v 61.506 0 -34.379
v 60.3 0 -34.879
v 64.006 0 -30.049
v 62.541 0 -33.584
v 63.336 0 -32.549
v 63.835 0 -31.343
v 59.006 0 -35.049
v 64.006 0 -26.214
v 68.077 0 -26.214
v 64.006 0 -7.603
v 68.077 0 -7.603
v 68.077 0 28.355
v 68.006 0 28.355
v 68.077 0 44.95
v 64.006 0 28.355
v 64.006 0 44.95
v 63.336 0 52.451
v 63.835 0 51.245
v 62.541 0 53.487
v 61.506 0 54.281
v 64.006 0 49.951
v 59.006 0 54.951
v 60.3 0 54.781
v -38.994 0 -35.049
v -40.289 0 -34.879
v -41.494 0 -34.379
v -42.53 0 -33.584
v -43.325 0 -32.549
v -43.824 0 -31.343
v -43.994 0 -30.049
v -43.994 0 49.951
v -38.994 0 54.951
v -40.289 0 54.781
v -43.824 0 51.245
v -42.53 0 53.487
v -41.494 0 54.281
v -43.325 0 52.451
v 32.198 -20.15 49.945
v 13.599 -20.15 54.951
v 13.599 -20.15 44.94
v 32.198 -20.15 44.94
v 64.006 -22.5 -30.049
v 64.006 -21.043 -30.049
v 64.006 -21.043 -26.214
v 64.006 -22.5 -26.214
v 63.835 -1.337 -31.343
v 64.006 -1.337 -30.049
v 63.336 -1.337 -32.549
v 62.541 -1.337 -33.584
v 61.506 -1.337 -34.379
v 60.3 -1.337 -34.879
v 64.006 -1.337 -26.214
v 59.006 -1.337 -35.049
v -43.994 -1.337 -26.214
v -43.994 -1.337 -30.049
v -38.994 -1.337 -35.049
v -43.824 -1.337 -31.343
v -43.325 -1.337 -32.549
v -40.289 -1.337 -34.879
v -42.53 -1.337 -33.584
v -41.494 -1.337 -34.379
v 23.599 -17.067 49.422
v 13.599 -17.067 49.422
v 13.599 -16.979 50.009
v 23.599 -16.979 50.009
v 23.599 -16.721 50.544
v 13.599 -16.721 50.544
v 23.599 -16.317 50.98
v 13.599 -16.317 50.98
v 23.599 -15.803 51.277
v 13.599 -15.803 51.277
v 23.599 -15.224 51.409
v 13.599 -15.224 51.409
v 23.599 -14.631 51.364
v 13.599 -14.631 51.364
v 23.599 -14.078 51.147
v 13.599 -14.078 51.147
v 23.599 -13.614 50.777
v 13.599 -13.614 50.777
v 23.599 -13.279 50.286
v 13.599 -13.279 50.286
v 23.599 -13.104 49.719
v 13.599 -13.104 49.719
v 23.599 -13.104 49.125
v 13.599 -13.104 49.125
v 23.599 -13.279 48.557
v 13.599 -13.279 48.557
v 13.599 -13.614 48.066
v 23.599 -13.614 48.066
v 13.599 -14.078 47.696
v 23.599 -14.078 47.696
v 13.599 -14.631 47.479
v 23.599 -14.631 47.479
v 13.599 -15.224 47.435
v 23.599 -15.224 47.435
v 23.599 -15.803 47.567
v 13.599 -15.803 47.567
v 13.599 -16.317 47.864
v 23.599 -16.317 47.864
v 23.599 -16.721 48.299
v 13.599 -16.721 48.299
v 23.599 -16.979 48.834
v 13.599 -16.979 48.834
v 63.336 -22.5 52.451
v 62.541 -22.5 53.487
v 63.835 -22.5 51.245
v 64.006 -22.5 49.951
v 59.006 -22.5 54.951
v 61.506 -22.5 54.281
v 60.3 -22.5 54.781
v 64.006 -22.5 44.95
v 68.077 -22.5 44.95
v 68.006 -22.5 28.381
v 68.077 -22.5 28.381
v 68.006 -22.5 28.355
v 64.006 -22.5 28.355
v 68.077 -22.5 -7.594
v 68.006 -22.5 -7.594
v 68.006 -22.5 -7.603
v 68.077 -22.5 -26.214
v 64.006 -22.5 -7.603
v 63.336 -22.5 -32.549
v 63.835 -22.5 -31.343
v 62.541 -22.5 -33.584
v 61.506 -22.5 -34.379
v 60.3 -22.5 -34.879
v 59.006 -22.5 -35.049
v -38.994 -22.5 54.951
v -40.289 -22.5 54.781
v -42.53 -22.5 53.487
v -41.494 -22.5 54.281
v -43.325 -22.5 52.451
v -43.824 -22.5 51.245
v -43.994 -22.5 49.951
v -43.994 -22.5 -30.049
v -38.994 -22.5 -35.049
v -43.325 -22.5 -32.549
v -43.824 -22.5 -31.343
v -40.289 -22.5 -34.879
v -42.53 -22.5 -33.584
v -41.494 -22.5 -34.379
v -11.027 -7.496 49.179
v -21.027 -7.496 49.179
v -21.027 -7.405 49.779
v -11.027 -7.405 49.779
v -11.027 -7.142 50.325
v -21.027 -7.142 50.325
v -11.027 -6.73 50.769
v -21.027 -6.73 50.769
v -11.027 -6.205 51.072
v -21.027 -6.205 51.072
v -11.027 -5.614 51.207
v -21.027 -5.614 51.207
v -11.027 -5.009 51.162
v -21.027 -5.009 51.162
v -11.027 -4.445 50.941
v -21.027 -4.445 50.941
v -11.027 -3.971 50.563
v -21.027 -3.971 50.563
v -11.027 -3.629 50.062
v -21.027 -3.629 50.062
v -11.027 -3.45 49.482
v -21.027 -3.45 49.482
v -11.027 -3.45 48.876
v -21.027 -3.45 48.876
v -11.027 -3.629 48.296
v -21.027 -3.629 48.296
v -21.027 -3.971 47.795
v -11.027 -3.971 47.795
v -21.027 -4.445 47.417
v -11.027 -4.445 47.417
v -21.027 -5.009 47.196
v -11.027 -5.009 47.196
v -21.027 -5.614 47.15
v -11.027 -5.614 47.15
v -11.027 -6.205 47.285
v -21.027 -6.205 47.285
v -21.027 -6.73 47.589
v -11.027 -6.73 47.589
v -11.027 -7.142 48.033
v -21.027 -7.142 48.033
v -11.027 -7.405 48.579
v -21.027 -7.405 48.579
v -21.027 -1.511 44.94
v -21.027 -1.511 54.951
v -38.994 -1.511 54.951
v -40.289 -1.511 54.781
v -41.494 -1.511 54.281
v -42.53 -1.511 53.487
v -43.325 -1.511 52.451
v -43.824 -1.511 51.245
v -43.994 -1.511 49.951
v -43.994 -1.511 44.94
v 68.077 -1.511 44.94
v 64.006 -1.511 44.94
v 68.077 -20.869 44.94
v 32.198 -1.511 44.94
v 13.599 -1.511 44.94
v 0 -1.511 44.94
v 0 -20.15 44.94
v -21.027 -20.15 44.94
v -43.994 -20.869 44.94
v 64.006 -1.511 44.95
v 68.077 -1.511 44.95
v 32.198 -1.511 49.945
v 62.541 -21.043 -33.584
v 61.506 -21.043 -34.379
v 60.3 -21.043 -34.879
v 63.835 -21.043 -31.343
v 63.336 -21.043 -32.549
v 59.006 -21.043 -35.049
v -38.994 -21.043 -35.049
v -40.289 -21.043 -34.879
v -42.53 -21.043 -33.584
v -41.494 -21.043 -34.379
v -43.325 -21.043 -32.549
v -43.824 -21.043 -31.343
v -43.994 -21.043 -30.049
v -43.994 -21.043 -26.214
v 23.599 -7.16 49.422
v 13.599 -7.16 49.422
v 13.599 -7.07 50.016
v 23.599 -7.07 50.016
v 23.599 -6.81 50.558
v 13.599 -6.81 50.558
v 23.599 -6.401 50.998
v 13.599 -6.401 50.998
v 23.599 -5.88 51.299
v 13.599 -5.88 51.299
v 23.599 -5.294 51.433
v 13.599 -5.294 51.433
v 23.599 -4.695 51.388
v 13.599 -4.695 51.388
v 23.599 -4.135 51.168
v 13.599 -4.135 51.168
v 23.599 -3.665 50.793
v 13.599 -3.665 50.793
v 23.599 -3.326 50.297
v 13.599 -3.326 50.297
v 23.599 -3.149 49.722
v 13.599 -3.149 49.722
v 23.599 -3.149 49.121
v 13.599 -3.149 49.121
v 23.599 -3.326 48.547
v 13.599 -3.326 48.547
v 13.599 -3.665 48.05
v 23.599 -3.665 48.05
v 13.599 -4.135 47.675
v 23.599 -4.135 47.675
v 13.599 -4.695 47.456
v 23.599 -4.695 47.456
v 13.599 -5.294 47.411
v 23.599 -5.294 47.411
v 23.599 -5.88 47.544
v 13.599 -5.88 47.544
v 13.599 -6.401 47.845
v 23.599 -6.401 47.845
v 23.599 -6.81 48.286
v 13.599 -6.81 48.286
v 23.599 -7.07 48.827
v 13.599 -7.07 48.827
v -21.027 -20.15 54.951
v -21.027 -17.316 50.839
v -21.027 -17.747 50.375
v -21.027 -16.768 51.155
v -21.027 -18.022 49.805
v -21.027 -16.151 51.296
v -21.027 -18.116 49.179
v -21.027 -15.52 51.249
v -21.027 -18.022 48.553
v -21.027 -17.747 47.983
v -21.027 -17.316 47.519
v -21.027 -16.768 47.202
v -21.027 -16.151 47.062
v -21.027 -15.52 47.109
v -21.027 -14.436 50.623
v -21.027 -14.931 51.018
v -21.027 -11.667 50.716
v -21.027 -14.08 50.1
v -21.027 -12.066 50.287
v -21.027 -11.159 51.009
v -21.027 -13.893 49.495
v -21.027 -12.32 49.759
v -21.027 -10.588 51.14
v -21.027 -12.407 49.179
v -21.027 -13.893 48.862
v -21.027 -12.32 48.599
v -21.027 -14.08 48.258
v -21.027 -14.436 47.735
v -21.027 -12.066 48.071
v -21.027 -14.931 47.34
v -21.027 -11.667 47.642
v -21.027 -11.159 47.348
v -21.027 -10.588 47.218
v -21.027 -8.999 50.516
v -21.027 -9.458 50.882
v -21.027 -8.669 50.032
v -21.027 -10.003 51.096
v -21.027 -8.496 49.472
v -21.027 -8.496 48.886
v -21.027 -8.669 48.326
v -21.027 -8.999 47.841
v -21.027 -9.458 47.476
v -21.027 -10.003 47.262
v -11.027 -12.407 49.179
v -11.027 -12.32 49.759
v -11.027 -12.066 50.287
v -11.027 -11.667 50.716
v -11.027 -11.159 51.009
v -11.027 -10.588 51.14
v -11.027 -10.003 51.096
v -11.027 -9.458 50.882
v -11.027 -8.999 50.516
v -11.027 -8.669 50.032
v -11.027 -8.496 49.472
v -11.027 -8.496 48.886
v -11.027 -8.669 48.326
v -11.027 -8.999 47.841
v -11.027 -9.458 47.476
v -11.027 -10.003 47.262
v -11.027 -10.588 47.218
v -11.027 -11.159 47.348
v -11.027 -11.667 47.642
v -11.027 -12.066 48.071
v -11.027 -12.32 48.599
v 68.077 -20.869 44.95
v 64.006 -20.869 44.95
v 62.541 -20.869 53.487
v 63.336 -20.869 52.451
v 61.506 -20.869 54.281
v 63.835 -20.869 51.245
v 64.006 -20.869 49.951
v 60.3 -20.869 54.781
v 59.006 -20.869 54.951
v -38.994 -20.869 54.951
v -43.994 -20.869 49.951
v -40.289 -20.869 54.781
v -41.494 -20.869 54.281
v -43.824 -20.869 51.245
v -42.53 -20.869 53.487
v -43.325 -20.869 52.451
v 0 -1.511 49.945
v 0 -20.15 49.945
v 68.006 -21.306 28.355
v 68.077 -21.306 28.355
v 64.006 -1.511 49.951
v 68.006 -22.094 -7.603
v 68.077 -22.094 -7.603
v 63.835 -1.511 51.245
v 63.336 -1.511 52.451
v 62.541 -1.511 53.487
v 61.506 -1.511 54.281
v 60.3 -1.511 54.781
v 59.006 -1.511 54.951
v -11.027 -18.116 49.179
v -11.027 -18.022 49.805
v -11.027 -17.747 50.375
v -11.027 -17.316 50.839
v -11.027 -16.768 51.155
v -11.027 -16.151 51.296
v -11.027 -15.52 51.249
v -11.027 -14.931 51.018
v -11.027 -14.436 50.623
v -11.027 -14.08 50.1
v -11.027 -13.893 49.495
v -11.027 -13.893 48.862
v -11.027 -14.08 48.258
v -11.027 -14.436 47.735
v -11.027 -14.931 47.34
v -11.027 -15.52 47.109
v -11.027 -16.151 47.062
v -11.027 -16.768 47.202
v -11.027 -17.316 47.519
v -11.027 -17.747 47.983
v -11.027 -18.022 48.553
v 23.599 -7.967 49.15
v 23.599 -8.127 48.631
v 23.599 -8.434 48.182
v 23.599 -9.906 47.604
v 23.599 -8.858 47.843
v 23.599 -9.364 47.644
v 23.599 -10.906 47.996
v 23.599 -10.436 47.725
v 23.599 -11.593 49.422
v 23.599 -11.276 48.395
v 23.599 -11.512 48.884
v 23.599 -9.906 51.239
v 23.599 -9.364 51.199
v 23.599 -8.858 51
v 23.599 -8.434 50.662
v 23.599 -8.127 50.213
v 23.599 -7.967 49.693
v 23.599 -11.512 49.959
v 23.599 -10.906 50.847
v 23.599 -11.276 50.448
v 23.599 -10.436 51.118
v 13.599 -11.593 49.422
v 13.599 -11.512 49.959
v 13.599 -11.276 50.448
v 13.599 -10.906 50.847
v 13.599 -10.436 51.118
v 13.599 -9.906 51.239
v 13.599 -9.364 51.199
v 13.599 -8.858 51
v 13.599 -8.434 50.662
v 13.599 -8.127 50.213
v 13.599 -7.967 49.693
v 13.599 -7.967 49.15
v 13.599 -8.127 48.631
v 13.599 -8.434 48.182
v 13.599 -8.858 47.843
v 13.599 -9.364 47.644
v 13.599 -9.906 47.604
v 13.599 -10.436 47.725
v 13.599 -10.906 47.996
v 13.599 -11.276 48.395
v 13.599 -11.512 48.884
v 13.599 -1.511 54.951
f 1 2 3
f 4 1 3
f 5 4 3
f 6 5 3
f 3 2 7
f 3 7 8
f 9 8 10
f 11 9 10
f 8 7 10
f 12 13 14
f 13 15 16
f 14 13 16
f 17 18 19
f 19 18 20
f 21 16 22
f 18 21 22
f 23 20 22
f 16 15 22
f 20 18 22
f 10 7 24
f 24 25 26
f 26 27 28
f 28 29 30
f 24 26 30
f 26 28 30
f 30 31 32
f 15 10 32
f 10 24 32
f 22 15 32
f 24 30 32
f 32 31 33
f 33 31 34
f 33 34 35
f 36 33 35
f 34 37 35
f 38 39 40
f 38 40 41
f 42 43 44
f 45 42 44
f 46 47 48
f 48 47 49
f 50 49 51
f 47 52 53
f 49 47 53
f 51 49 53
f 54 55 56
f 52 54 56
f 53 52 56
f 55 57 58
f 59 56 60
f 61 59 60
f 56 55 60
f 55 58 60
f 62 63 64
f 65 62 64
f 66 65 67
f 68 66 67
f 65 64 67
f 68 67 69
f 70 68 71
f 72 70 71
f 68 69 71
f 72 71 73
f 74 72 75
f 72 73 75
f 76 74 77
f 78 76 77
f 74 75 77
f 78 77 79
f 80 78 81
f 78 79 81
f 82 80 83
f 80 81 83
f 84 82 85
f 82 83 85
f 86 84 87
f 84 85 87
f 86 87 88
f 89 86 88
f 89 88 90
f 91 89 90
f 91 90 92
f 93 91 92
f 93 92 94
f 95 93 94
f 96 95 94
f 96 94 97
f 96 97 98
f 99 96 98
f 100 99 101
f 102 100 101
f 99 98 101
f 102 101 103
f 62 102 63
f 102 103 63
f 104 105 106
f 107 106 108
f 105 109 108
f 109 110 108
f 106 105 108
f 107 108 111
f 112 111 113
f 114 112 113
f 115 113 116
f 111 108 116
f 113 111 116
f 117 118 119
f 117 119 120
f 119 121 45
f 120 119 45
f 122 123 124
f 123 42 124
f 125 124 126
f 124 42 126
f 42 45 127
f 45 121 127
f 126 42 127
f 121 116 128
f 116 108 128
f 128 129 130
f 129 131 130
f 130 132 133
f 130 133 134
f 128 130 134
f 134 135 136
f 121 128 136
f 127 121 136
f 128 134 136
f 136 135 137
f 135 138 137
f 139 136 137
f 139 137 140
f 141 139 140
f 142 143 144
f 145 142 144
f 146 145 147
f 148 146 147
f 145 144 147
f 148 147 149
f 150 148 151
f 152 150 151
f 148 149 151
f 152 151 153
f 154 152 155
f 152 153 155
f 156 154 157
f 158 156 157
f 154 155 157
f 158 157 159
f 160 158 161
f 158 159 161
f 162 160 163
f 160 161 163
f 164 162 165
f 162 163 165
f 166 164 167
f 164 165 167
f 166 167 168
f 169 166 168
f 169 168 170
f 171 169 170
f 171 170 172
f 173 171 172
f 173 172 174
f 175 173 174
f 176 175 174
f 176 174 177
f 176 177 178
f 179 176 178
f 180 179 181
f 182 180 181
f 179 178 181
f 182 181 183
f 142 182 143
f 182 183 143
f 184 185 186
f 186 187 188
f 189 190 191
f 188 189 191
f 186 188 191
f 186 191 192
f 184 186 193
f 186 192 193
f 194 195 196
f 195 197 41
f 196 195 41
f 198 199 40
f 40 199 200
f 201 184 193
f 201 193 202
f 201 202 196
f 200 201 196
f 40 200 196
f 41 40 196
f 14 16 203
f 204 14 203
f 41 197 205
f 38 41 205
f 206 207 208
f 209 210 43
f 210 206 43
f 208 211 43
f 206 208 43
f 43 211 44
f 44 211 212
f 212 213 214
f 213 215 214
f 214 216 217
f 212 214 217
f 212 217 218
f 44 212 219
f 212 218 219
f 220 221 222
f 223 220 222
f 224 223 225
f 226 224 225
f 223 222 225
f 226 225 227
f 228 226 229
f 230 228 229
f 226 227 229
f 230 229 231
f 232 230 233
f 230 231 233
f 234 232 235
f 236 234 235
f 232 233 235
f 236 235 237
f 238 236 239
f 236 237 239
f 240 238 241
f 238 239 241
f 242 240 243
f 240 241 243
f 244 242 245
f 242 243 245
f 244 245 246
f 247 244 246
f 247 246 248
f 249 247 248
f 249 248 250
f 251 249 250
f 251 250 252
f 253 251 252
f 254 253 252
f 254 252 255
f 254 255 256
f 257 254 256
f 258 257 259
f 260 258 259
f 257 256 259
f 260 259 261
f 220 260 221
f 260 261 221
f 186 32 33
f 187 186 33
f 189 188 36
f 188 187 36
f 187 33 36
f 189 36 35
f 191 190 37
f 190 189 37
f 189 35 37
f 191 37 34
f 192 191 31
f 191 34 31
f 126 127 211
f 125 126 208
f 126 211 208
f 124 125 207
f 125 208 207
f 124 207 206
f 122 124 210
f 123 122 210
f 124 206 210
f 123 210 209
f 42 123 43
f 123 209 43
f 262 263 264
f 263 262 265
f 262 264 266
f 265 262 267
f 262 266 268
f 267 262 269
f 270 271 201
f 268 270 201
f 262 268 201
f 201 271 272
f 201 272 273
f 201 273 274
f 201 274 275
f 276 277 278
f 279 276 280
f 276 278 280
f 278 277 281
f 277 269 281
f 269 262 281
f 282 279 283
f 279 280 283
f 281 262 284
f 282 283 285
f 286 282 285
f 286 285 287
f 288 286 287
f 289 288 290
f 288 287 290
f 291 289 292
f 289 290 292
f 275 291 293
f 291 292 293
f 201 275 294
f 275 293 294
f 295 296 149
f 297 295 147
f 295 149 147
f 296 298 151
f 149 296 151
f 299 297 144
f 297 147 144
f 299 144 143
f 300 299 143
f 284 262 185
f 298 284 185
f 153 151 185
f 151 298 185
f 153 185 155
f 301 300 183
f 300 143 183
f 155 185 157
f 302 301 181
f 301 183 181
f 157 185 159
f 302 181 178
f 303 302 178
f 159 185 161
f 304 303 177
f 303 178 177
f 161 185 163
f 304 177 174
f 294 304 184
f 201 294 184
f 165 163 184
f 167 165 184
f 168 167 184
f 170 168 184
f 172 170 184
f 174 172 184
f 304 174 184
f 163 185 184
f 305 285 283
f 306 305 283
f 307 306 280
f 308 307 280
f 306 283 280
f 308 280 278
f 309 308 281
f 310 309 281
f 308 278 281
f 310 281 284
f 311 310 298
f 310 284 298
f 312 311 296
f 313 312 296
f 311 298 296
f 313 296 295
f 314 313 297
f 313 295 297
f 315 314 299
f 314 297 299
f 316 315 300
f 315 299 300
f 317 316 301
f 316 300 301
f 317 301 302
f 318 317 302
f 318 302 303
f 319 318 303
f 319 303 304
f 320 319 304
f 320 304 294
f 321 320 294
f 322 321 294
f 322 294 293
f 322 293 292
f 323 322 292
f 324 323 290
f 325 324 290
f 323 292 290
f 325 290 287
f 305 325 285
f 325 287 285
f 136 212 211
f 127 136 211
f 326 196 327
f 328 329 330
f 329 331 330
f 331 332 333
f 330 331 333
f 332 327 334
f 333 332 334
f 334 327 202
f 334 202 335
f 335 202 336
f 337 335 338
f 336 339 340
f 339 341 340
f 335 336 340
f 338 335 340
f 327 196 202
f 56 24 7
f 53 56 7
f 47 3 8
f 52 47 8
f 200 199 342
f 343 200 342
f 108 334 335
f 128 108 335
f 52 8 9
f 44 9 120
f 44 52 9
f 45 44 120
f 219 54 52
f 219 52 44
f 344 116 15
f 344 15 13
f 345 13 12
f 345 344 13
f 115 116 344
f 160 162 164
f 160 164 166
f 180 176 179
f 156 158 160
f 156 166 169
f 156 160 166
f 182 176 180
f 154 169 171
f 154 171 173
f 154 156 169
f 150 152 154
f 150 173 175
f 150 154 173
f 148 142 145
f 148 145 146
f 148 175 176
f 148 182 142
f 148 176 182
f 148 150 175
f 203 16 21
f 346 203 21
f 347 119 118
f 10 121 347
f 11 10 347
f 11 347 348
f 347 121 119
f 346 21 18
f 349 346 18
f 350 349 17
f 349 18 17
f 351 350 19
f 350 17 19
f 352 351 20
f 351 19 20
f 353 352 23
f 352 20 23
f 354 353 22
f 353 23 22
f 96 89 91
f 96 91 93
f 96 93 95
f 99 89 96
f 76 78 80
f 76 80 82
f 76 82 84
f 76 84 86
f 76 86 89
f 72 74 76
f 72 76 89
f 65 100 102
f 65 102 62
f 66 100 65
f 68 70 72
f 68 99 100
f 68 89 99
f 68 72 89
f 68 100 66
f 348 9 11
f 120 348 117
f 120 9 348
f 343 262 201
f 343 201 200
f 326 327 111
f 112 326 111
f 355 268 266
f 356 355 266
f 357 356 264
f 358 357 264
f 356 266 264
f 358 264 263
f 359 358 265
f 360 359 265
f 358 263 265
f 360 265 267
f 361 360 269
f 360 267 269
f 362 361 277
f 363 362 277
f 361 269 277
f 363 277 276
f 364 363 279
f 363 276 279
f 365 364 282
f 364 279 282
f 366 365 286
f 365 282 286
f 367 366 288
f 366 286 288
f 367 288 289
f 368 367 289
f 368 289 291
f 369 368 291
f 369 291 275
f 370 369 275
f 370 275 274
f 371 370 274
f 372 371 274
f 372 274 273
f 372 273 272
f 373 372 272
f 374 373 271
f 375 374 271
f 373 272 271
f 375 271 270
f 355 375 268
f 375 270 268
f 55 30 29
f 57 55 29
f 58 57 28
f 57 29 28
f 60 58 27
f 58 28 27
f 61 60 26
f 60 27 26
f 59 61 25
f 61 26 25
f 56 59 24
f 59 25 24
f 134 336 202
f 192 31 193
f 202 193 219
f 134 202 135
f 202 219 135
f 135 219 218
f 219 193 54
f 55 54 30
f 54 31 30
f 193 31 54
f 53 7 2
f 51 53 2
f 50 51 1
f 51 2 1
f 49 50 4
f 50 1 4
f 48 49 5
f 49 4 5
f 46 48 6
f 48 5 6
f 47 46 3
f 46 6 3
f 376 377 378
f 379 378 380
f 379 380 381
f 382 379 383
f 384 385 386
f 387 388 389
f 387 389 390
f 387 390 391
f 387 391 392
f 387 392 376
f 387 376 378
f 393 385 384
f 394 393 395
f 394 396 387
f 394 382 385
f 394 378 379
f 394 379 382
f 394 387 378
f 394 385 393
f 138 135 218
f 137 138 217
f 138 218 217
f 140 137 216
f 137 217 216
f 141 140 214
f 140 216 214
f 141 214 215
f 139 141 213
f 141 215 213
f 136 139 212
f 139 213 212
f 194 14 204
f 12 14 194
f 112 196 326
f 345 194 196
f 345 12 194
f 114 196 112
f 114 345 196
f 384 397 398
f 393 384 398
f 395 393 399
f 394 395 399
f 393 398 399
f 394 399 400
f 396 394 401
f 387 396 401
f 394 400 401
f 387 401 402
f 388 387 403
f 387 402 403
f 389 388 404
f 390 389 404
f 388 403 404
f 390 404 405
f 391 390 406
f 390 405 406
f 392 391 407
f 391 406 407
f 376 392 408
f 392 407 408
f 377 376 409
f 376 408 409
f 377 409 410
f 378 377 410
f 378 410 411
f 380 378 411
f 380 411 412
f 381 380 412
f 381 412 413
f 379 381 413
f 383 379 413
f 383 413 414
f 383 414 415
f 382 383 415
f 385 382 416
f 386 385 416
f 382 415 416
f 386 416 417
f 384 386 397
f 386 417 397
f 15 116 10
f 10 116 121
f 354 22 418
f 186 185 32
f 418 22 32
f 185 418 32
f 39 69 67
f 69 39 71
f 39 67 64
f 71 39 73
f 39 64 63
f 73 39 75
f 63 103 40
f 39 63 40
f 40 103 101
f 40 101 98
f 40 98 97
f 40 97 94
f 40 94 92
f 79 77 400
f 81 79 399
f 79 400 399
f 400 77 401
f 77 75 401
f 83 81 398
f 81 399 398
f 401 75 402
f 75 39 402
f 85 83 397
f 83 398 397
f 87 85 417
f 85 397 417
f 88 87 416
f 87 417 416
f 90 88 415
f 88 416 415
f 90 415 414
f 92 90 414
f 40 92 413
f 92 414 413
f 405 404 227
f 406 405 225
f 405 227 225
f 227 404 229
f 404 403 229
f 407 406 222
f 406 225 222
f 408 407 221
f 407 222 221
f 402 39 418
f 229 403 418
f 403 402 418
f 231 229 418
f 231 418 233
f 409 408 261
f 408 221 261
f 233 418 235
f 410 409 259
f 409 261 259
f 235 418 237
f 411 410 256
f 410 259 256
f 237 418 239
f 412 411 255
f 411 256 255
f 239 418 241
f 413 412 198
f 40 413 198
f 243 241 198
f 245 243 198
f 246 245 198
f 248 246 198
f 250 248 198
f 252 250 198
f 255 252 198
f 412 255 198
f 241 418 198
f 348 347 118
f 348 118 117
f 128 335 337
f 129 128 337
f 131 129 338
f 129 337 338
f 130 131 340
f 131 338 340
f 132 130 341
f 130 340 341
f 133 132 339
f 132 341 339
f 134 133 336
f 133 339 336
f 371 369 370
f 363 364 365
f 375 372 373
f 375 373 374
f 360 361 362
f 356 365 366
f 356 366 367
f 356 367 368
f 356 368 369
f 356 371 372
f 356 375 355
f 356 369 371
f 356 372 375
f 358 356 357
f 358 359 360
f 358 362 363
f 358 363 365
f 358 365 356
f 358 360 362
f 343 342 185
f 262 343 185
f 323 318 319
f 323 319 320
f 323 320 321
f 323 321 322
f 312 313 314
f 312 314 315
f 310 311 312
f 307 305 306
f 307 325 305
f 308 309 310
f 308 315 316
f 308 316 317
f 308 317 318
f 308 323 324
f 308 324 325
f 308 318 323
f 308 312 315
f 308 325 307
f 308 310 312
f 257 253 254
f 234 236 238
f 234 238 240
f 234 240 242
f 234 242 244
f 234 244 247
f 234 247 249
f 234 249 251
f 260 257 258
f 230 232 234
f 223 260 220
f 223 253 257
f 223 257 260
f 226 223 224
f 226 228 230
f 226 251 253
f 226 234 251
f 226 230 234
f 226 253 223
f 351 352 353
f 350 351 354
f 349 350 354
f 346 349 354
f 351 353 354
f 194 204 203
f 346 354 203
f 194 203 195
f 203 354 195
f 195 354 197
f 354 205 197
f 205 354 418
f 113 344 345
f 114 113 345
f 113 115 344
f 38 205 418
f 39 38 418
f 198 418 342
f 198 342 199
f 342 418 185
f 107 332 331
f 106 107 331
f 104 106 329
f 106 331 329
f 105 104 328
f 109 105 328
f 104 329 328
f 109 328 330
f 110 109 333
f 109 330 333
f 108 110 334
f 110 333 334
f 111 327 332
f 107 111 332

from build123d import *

# Parameters (mm, degrees)
F1_DEPTH  = 22.5
F2_W      = 19.3578329636
F2_H      = 6.3240909576
F2_H_2    = 5.0115762651
F2_W_2    = 19.7066257242
F2_H_3    = 3.8353008032
F2_H_4    = 6.6283914447
F3_DEPTH  = 155.21203
F5_DEPTH  = 18.63889
F6_R      = 2.0341510362
F6_R_2    = 1.9663944792
F6_R_3    = 2.1232474026
F7_DEPTH  = 10
F8_R      = 2.0166596657
F8_R_2    = 1.8228540719
F8_R_3    = 1.9926186892
F9_DEPTH  = 10
F11_DEPTH = 5.64108
F13_DEPTH = 40.33136
F12_W     = 4
F12_H     = 18.4578578919
F12_H_2   = 17.5
F14_DEPTH = 25
F16_W     = 1.5692119678
F16_H     = 22.5
F17_DEPTH = 78.97005
F18_DEPTH = 25
F19_DEPTH = 25


with BuildPart() as f1:
    # F0 (on Front) → F1 (new body)
    with BuildSketch(Plane.XZ):
        with BuildLine():
            ThreePointArc((-43.9944155514, -30.0488834083), (-42.5299494574, -33.5844173142), (-38.9944155514, -35.0488834083))
            Line((-38.9944155514, -35.0488834083), (59.0055844486, -35.0488834083))
            ThreePointArc((59.0055844486, -35.0488834083), (62.5411183545, -33.5844173142), (64.0055844486, -30.0488834083))
            Line((64.0055844486, -30.0488834083), (64.0055844486, 49.9511165917))
            ThreePointArc((64.0055844486, 49.9511165917), (62.5411183545, 53.4866504976), (59.0055844486, 54.9511165917))
            Line((59.0055844486, 54.9511165917), (-38.9944155514, 54.9511165917))
            ThreePointArc((-38.9944155514, 54.9511165917), (-42.5299494574, 53.4866504976), (-43.9944155514, 49.9511165917))
            Line((-43.9944155514, 49.9511165917), (-43.9944155514, -30.0488834083))
        make_face()
    extrude(amount=F1_DEPTH)

    # F2 (on face) → F3 (cut)
    with BuildSketch(Plane(origin=(-43.9944155514, 0, 0), x_dir=(0, -1, 0), z_dir=(-1, 0, 0))):
        with Locations((11.1899548792, 53.1131620705)):
            Rectangle(F2_W, F2_H)
        with Locations((11.1899548792, 47.4453284591)):
            Rectangle(F2_W, F2_H_2)
        with Locations((11.1899542389, -28.1312330067)):
            Rectangle(F2_W_2, F2_H_3)
        with Locations((11.1899542389, -33.3630791306)):
            Rectangle(F2_W_2, F2_H_4)
    extrude(amount=-F3_DEPTH, mode=Mode.SUBTRACT)

    # F4 (on face) → F5 (join)
    with BuildSketch(Plane.XZ.offset(1.5110383974)):
        Polygon((0, 49.9453284591), (-21.0268571973, 54.9511165917), (-21.0268571973, 44.9395403266), (0, 44.9395403266), align=None)
        Polygon((32.1980565786, 49.9453284591), (13.5992644355, 54.9511165917), (13.5992644355, 44.9395403266), (32.1980565786, 44.9395403266), align=None)
    extrude(amount=F5_DEPTH)

    # F6 (on face) → F7 (cut)
    with BuildSketch(Plane(origin=(-21.0268571973, 0, 0), x_dir=(0, -1, 0), z_dir=(-1, 0, 0))):
        with Locations((5.4616648704, 49.1789467633)):
            Circle(F6_R)
        with Locations((10.4407919571, 49.1789467633)):
            Circle(F6_R_2)
        with Locations((15.9926619381, 49.1789467633)):
            Circle(F6_R_3)
    extrude(amount=-F7_DEPTH, mode=Mode.SUBTRACT)

    # F8 (on face) → F9 (cut)
    with BuildSketch(Plane(origin=(13.5992644355, 0, 0), x_dir=(0, -1, 0), z_dir=(-1, 0, 0))):
        with Locations((5.1434063353, 49.4216457009)):
            Circle(F8_R)
        with Locations((9.7698038444, 49.4216457009)):
            Circle(F8_R_2)
        with Locations((15.0747206062, 49.4216457009)):
            Circle(F8_R_3)
    extrude(amount=-F9_DEPTH, mode=Mode.SUBTRACT)

    # F10 (on face) → F11 (join)
    with BuildSketch(Plane.YZ.offset(64.0055844486)):
        Polygon((-20.868871361, 44.9503771961), (-22.5, 44.9503771961), (-22.5, 28.3550862223), (0, 28.3550862223), (0, 44.9503771961), (-1.5110383974, 44.9503771961), (-1.5110383974, 44.9395403266), (-20.868871361, 44.9395403266), align=None)
        Polygon((0, -8.5606295615), (-22.5, -8.5606295615), (-22.5, -26.2135826051), (-21.043267101, -26.2135826051), (-1.3366413768, -26.2135826051), (0, -26.2135826051), align=None)
    extrude(amount=F11_DEPTH)

    # F13 (add): a face of the model
    f13_faces = [f1.faces().sort_by_distance(p)[0] for p in [
        (66.8261244486, -11.25, 28.3550862223),
    ]]
    extrude(f13_faces, amount=F13_DEPTH)

    # F12 (on face) → F14 (cut)
    with BuildSketch(Plane.XZ.offset(22.5)):
        with Locations((66.0055844486, 19.1261572763)):
            Rectangle(F12_W, F12_H)
        with Locations((66.0055844486, 1.1472283304)):
            Rectangle(F12_W, F12_H_2)
    extrude(amount=-F14_DEPTH, mode=Mode.SUBTRACT)

    # F16 (on face) → F17 (cut)
    with BuildSketch(Plane(origin=(0, 0, -26.2135826051), x_dir=(1, 0, 0), z_dir=(0, 0, -1))):
        with Locations((68.8620584647, 11.25)):
            Rectangle(F16_W, F16_H)
    extrude(amount=-F17_DEPTH, mode=Mode.SUBTRACT)

    # F15 (on face) → F18 (cut)
    with BuildSketch(Plane(origin=(68.0055844486, 0, 0), x_dir=(0, -1, 0), z_dir=(-1, 0, 0))):
        Polygon((0, -7.6027716696), (22.0939440089, -7.6027716696), (21.3063190472, 28.3550862223), (0, 28.3550862223), align=None)
    extrude(amount=-F18_DEPTH, mode=Mode.SUBTRACT)

    # F19 (cut): a face of the model
    f19_faces = [f1.faces().sort_by_distance(p)[0] for p in [
        (68.0415184647, -21.7001315281, 10.3761572763),
    ]]
    extrude(f19_faces, amount=-F19_DEPTH, mode=Mode.SUBTRACT)


solid = f1.part
